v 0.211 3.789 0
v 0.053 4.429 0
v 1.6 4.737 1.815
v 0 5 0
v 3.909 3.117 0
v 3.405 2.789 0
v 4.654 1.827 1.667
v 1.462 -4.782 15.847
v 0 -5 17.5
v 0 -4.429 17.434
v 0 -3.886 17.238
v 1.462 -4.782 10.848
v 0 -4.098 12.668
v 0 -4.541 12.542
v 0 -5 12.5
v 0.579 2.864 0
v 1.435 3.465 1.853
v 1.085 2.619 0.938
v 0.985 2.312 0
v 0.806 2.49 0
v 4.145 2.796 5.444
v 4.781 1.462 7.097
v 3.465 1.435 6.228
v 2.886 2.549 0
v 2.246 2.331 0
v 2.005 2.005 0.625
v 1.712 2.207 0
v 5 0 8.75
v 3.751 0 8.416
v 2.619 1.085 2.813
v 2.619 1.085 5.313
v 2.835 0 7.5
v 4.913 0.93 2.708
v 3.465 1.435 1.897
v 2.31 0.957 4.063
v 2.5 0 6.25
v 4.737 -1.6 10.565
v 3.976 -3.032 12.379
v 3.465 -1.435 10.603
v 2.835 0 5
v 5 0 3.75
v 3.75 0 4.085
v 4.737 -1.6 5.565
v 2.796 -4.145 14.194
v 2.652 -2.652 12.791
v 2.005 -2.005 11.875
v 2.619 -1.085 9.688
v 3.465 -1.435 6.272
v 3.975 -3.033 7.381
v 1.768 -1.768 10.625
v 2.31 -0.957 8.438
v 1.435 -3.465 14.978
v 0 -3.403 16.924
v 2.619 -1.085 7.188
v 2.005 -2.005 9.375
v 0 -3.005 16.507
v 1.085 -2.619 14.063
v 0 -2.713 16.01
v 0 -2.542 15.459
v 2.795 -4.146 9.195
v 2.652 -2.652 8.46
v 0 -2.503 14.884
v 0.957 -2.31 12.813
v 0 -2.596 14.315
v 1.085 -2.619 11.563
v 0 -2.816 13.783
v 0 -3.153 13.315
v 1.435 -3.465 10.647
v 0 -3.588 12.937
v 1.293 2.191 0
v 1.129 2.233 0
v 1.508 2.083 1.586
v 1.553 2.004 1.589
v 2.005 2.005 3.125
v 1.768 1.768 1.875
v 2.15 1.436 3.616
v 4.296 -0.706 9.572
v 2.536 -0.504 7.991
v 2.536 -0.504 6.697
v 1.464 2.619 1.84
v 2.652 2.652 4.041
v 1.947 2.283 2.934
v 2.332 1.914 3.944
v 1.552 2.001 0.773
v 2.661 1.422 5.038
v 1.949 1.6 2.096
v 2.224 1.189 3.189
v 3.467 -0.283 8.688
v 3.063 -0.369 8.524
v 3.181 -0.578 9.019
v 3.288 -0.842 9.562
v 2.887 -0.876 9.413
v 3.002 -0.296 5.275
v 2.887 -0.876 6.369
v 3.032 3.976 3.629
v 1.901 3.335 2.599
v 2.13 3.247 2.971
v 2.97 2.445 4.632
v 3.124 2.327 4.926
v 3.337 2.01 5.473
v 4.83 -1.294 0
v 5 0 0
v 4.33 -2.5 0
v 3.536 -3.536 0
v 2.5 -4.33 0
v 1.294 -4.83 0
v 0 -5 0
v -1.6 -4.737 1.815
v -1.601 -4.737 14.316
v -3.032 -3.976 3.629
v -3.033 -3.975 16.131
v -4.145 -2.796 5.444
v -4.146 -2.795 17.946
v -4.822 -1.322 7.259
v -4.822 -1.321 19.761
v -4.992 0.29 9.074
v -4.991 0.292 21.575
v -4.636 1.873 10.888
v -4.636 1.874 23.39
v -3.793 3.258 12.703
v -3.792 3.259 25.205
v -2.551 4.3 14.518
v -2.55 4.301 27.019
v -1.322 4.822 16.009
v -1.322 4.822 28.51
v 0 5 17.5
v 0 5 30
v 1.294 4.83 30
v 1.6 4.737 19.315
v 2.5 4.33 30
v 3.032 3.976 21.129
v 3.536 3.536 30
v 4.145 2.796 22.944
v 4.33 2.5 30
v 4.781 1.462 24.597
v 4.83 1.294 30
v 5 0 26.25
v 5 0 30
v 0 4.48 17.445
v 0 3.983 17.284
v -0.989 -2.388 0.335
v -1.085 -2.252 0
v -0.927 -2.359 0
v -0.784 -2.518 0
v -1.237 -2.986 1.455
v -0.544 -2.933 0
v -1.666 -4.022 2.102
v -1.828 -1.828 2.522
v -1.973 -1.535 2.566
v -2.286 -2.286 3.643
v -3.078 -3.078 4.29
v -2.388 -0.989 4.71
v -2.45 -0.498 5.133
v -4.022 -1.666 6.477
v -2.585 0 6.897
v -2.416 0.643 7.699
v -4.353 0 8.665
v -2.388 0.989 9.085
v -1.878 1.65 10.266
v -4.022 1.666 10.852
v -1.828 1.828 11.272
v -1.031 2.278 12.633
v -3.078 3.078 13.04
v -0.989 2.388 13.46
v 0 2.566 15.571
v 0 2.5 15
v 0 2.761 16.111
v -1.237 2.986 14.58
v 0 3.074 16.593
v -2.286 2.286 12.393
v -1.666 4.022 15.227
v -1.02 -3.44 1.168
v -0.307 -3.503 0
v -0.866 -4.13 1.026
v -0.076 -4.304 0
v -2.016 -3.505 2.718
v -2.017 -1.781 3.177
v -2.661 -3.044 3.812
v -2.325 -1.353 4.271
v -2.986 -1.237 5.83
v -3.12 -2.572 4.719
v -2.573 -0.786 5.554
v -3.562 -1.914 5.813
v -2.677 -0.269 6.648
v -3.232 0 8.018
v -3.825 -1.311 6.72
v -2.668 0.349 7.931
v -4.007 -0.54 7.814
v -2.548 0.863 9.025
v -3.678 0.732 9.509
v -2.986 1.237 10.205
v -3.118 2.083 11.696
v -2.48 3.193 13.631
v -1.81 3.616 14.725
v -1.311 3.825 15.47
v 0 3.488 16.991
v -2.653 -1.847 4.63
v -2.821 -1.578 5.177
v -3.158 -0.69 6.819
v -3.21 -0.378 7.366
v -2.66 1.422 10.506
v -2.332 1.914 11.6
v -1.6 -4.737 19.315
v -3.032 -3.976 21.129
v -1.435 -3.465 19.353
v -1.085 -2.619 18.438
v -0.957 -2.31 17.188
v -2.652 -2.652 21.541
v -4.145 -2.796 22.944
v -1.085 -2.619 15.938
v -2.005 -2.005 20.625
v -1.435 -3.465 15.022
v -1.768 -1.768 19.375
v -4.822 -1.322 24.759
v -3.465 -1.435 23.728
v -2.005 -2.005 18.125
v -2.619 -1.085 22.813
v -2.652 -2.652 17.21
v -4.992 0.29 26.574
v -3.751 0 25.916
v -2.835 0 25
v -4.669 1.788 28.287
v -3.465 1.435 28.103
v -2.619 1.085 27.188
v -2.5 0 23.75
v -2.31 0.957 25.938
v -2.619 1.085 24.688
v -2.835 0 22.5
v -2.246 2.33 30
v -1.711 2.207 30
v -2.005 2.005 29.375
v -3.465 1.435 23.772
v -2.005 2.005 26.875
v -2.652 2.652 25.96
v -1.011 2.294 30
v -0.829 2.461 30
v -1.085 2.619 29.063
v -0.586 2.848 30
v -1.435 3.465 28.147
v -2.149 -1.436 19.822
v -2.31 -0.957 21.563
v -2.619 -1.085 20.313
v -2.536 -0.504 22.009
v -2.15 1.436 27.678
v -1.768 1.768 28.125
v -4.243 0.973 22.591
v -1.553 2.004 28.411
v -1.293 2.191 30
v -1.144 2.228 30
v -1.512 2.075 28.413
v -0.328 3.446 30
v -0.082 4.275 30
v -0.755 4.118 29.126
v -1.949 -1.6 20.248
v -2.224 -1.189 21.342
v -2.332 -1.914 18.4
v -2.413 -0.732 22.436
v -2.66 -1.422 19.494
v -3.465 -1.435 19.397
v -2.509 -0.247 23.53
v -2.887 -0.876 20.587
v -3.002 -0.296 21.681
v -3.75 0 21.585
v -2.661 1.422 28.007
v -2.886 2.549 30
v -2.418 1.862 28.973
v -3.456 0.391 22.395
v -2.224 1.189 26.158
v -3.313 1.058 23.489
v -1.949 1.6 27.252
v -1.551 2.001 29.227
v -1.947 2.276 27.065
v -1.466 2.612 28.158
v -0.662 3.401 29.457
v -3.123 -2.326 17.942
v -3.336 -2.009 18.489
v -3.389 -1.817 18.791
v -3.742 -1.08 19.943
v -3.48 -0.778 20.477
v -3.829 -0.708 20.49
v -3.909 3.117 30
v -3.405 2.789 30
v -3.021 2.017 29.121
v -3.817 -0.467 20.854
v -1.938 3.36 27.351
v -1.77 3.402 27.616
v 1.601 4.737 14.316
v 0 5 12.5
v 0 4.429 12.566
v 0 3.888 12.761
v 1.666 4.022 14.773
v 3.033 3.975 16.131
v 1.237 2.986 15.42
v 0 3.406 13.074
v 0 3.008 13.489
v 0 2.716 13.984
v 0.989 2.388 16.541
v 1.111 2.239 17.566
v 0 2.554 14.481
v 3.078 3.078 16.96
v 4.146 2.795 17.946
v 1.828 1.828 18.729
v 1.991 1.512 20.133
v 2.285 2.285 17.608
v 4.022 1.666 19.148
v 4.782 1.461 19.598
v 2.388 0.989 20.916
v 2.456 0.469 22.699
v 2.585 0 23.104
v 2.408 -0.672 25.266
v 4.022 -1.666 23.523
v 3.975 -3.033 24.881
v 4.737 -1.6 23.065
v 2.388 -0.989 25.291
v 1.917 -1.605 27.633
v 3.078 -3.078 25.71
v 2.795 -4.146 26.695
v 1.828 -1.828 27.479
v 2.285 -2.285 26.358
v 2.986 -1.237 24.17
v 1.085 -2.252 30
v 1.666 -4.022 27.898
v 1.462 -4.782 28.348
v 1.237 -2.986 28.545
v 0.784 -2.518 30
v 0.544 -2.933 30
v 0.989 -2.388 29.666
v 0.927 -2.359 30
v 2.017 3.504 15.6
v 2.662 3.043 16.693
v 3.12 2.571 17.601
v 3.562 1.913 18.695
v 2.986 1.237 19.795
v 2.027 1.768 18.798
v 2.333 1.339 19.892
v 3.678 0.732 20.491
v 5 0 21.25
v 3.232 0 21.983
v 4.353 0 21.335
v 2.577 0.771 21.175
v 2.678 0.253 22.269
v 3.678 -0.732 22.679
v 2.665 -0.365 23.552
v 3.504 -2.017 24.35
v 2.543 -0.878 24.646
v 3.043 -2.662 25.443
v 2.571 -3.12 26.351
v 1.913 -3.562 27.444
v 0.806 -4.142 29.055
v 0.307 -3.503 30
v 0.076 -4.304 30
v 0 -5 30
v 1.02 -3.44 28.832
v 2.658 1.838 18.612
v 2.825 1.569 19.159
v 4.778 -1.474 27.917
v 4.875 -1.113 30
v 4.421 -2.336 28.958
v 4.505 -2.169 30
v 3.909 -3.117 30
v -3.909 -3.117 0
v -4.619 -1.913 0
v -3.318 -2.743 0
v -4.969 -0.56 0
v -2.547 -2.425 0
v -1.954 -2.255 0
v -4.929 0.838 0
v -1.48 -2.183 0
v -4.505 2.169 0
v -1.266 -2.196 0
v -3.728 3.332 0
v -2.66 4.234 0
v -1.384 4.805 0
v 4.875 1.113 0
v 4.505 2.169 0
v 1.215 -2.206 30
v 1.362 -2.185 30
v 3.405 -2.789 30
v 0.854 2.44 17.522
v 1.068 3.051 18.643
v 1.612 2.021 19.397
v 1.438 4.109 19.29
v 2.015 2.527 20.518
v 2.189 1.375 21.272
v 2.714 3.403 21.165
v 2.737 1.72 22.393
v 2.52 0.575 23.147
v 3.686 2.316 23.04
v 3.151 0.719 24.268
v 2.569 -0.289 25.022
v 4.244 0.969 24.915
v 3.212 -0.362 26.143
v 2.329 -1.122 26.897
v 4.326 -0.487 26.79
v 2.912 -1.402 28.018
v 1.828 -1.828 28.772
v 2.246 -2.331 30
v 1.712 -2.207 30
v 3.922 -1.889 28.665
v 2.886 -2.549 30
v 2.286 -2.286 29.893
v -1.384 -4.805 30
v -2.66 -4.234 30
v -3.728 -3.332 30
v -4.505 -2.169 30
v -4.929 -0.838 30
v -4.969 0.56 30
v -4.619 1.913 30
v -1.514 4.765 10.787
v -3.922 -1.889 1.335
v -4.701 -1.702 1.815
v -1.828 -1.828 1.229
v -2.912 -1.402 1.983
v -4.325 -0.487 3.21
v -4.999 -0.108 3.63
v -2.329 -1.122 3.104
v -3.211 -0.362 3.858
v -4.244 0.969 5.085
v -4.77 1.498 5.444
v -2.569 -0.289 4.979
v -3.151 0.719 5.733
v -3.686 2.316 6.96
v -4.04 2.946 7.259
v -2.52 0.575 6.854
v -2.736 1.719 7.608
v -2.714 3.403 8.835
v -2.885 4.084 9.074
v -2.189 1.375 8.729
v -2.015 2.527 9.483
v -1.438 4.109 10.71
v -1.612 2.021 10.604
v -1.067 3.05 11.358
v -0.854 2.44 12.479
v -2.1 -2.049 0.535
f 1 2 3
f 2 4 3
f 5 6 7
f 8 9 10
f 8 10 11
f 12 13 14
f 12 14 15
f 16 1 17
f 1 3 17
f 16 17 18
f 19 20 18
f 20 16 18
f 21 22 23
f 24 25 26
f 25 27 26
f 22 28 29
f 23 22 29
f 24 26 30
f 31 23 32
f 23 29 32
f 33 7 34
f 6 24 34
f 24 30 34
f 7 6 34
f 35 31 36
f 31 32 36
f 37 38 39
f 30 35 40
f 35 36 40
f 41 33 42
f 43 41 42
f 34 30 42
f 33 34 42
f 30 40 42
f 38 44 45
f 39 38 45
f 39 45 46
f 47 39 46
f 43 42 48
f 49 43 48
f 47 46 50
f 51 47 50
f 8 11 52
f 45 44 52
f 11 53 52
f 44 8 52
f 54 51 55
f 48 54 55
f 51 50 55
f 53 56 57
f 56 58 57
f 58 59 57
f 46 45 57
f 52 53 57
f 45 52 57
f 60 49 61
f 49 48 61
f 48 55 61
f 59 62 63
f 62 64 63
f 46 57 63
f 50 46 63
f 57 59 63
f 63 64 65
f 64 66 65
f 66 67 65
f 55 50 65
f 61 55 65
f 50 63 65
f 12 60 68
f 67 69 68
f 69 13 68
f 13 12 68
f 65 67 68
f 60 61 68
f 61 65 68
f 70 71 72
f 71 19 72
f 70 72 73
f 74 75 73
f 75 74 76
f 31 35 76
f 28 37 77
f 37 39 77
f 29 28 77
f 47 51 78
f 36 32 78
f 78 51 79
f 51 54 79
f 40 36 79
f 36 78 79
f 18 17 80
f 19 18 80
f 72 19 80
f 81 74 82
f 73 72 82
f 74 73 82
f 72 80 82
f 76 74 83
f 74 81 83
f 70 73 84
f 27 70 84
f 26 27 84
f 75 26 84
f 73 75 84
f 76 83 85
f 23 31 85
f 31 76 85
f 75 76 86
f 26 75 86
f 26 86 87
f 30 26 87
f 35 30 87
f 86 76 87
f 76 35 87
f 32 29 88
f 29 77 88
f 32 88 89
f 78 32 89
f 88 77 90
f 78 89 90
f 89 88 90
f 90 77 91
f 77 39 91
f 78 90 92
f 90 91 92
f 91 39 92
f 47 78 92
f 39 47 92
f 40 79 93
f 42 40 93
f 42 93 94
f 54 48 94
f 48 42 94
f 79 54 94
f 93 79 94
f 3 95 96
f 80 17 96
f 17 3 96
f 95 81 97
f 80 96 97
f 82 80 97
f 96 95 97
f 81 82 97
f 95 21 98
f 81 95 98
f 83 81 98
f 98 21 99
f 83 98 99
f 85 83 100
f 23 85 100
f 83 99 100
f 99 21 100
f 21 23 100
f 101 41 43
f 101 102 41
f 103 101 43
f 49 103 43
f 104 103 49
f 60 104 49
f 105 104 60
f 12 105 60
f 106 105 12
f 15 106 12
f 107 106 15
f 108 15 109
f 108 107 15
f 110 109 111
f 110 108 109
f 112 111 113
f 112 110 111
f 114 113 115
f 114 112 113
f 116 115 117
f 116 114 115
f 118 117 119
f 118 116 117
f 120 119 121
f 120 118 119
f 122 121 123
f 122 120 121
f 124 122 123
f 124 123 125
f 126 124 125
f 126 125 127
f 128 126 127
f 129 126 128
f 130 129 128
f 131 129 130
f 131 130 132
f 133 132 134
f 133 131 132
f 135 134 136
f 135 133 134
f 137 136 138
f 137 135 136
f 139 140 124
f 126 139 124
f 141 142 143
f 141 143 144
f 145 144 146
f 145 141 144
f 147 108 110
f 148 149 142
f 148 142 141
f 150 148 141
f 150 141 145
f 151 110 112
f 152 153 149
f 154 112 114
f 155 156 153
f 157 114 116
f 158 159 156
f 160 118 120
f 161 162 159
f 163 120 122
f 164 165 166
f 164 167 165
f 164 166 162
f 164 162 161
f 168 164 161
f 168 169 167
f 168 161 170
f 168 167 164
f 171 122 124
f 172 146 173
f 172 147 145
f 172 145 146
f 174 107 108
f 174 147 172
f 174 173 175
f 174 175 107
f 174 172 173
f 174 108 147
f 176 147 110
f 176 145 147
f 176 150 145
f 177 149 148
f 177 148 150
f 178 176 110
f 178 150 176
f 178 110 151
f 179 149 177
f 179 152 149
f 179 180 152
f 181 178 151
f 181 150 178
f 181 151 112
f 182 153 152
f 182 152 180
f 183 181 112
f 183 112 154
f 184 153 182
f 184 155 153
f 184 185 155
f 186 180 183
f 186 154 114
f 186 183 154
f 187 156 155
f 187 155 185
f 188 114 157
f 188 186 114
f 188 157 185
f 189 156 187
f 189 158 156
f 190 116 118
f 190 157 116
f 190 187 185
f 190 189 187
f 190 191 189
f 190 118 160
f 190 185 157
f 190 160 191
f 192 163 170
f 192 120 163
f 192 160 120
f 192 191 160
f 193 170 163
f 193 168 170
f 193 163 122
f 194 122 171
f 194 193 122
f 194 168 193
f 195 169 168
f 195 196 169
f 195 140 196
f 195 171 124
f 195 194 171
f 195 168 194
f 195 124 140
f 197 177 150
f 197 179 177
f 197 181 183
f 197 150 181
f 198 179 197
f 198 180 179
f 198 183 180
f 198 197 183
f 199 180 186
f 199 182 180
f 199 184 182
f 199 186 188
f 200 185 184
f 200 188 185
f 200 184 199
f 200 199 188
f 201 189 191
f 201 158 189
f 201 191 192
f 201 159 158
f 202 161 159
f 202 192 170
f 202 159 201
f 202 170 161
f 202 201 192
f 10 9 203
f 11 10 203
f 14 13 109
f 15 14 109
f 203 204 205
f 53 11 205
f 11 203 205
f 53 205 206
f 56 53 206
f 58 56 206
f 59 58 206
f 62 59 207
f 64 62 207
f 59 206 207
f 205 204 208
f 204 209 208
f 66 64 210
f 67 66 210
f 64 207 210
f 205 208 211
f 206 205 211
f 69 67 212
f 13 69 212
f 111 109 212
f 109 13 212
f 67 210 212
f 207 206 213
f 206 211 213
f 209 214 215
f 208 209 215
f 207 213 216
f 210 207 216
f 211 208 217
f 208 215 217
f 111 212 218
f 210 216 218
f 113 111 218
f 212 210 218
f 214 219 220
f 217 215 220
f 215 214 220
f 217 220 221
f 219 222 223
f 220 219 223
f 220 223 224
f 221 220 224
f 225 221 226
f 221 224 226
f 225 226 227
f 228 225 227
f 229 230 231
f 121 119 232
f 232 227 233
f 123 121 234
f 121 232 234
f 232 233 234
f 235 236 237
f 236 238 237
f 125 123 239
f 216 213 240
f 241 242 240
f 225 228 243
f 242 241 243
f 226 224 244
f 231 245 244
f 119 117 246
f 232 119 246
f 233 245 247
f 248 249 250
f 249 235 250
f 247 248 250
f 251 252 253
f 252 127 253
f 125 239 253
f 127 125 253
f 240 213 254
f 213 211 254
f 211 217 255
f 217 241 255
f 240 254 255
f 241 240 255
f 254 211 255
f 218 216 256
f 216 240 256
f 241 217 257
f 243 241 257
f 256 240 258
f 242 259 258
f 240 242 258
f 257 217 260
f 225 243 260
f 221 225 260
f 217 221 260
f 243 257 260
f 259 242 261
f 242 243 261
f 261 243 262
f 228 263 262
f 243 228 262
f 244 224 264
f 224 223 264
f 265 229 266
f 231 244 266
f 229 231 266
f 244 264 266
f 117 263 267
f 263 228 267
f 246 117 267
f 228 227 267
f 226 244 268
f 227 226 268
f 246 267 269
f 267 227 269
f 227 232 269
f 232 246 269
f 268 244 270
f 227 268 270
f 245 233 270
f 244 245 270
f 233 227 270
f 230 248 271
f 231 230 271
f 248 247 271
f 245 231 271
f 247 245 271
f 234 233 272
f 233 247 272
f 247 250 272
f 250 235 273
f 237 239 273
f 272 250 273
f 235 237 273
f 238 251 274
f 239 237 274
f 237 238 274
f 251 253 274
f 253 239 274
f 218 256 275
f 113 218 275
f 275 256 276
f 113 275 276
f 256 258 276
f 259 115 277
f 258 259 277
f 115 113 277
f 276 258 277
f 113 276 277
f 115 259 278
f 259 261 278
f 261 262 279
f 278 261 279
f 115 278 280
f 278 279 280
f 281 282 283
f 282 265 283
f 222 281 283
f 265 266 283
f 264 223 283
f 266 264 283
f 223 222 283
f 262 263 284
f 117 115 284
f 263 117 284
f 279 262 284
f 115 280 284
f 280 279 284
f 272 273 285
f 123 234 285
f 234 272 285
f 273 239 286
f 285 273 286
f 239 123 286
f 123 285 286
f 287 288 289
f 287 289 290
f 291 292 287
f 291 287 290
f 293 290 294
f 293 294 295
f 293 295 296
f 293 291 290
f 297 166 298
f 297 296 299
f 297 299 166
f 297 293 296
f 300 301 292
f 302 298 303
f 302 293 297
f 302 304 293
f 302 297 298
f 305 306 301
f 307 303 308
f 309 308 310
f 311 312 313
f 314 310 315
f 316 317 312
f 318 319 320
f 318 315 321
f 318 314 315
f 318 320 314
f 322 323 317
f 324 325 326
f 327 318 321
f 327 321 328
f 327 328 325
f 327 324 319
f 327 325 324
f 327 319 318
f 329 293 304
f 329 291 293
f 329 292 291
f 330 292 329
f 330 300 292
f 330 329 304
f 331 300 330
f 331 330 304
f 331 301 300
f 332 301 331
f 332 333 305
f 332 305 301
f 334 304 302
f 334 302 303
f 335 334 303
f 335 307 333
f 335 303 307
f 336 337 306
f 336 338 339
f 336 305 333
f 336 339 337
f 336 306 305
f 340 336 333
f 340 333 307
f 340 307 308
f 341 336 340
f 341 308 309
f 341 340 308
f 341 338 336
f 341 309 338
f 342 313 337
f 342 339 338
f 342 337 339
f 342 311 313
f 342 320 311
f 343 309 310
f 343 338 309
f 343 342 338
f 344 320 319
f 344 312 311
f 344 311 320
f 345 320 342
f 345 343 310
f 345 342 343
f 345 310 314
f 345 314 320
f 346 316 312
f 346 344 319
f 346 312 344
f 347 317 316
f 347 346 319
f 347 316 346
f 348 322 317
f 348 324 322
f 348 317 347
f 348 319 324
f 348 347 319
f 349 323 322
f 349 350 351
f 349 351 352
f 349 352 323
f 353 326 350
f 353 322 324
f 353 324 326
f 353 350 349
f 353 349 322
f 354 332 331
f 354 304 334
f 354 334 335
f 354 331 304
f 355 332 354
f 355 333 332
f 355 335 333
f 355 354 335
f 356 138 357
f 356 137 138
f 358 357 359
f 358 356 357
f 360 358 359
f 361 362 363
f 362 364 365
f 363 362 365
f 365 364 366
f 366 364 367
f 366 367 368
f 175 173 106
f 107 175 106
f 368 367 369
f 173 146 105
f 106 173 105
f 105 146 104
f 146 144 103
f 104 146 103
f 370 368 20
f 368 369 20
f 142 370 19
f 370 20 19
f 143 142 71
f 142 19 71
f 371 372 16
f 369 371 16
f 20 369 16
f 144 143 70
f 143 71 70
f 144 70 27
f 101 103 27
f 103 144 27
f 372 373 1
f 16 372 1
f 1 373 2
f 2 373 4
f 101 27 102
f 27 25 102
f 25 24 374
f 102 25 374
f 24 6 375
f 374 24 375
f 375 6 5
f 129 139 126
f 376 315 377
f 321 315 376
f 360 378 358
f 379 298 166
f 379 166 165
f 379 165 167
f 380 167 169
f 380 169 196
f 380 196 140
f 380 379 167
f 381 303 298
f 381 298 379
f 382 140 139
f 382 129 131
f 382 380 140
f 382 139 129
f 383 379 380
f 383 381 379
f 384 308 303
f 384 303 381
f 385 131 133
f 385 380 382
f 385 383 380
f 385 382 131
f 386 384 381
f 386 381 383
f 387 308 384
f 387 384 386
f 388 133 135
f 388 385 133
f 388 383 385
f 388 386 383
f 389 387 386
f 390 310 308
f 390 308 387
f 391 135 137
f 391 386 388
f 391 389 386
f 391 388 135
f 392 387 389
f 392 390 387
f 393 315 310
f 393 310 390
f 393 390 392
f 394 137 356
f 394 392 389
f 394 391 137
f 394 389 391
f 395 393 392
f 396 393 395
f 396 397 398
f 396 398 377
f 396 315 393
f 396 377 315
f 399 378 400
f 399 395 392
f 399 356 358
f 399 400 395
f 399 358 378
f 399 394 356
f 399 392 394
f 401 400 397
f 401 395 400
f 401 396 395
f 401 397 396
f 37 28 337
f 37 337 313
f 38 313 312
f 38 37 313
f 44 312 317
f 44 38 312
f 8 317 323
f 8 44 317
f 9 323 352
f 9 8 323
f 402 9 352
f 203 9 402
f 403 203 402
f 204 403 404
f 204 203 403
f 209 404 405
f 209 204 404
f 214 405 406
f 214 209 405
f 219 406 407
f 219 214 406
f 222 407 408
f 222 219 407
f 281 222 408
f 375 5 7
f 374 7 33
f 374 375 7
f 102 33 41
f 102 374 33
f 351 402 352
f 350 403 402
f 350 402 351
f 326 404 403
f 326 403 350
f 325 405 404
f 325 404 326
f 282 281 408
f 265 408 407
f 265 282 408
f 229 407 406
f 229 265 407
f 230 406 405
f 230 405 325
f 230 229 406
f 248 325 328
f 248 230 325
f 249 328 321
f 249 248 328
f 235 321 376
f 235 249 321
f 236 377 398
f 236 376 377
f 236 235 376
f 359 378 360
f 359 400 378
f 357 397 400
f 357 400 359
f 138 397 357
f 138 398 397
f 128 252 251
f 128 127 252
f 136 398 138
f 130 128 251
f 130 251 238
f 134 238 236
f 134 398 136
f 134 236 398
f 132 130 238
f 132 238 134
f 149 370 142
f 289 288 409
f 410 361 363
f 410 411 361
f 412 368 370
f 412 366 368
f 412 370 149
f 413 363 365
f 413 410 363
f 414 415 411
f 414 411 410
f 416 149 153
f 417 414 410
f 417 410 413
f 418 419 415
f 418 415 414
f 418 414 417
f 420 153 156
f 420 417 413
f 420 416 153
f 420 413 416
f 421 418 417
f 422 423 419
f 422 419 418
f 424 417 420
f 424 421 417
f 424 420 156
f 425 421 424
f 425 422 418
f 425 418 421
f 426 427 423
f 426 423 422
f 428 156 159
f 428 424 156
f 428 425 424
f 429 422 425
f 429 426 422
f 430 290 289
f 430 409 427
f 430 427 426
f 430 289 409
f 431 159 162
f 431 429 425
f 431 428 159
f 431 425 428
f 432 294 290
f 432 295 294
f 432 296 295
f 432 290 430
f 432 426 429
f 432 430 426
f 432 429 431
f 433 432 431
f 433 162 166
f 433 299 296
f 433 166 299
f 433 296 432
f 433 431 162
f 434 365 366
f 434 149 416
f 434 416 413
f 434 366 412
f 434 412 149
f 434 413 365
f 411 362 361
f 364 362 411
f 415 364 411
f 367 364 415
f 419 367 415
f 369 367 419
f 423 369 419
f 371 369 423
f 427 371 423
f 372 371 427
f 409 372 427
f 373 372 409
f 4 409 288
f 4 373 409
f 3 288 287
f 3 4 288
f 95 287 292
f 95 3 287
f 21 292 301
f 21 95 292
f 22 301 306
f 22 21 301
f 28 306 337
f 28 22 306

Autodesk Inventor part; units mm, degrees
ref_plane "YZ Plane" through (0, 0, 0) normal (1, 0, 0) x (0, 1, 0)
ref_plane "XZ Plane" through (0, 0, 0) normal (0, 1, 0) x (-1, 0, 0)
ref_plane "XY Plane" through (0, 0, 0) normal (0, 0, 1) x (1, 0, 0)
sketch "Sketch1" plane through (0, 0, 0) normal (0, 0, 1) x (1, 0, 0)
  circle A0 centre (0, 0) radius 5
  dimension "d0" = 10
extrude "Extrusion1" add sketch "Sketch1" along normal blind 30
sketch "Sketch2" plane through (0, 0, 0) normal (1, 0, 0) x (0, 1, 0)
  line L0 (-5, 0) -> (5, 0) projected
  line L1 (5, 0) -> (5, -2.5)
  circle A0 centre (5, -2.5) radius 2.5
  line L2 (-5, 0) -> (-5, -2.5)
  circle A1 centre (-5, -2.5) radius 2.5
  point P0 (0, 0)
  dimension "d3" = 2.5
  dimension "d4" = 5
  dimension "d5" = 2.5
  dimension "d6" = 5
coil "Coil1" sketch "Sketch2" operation cut axis through (0, 0, -10) along (0, 0, 1) pitch 35 turns 1 hand left contours A0
coil "Coil2" sketch "Sketch2" operation cut axis through (0, 0, -10) along (0, 0, 1) pitch 35 turns 1 hand left contours A1
properties part number "screw"
